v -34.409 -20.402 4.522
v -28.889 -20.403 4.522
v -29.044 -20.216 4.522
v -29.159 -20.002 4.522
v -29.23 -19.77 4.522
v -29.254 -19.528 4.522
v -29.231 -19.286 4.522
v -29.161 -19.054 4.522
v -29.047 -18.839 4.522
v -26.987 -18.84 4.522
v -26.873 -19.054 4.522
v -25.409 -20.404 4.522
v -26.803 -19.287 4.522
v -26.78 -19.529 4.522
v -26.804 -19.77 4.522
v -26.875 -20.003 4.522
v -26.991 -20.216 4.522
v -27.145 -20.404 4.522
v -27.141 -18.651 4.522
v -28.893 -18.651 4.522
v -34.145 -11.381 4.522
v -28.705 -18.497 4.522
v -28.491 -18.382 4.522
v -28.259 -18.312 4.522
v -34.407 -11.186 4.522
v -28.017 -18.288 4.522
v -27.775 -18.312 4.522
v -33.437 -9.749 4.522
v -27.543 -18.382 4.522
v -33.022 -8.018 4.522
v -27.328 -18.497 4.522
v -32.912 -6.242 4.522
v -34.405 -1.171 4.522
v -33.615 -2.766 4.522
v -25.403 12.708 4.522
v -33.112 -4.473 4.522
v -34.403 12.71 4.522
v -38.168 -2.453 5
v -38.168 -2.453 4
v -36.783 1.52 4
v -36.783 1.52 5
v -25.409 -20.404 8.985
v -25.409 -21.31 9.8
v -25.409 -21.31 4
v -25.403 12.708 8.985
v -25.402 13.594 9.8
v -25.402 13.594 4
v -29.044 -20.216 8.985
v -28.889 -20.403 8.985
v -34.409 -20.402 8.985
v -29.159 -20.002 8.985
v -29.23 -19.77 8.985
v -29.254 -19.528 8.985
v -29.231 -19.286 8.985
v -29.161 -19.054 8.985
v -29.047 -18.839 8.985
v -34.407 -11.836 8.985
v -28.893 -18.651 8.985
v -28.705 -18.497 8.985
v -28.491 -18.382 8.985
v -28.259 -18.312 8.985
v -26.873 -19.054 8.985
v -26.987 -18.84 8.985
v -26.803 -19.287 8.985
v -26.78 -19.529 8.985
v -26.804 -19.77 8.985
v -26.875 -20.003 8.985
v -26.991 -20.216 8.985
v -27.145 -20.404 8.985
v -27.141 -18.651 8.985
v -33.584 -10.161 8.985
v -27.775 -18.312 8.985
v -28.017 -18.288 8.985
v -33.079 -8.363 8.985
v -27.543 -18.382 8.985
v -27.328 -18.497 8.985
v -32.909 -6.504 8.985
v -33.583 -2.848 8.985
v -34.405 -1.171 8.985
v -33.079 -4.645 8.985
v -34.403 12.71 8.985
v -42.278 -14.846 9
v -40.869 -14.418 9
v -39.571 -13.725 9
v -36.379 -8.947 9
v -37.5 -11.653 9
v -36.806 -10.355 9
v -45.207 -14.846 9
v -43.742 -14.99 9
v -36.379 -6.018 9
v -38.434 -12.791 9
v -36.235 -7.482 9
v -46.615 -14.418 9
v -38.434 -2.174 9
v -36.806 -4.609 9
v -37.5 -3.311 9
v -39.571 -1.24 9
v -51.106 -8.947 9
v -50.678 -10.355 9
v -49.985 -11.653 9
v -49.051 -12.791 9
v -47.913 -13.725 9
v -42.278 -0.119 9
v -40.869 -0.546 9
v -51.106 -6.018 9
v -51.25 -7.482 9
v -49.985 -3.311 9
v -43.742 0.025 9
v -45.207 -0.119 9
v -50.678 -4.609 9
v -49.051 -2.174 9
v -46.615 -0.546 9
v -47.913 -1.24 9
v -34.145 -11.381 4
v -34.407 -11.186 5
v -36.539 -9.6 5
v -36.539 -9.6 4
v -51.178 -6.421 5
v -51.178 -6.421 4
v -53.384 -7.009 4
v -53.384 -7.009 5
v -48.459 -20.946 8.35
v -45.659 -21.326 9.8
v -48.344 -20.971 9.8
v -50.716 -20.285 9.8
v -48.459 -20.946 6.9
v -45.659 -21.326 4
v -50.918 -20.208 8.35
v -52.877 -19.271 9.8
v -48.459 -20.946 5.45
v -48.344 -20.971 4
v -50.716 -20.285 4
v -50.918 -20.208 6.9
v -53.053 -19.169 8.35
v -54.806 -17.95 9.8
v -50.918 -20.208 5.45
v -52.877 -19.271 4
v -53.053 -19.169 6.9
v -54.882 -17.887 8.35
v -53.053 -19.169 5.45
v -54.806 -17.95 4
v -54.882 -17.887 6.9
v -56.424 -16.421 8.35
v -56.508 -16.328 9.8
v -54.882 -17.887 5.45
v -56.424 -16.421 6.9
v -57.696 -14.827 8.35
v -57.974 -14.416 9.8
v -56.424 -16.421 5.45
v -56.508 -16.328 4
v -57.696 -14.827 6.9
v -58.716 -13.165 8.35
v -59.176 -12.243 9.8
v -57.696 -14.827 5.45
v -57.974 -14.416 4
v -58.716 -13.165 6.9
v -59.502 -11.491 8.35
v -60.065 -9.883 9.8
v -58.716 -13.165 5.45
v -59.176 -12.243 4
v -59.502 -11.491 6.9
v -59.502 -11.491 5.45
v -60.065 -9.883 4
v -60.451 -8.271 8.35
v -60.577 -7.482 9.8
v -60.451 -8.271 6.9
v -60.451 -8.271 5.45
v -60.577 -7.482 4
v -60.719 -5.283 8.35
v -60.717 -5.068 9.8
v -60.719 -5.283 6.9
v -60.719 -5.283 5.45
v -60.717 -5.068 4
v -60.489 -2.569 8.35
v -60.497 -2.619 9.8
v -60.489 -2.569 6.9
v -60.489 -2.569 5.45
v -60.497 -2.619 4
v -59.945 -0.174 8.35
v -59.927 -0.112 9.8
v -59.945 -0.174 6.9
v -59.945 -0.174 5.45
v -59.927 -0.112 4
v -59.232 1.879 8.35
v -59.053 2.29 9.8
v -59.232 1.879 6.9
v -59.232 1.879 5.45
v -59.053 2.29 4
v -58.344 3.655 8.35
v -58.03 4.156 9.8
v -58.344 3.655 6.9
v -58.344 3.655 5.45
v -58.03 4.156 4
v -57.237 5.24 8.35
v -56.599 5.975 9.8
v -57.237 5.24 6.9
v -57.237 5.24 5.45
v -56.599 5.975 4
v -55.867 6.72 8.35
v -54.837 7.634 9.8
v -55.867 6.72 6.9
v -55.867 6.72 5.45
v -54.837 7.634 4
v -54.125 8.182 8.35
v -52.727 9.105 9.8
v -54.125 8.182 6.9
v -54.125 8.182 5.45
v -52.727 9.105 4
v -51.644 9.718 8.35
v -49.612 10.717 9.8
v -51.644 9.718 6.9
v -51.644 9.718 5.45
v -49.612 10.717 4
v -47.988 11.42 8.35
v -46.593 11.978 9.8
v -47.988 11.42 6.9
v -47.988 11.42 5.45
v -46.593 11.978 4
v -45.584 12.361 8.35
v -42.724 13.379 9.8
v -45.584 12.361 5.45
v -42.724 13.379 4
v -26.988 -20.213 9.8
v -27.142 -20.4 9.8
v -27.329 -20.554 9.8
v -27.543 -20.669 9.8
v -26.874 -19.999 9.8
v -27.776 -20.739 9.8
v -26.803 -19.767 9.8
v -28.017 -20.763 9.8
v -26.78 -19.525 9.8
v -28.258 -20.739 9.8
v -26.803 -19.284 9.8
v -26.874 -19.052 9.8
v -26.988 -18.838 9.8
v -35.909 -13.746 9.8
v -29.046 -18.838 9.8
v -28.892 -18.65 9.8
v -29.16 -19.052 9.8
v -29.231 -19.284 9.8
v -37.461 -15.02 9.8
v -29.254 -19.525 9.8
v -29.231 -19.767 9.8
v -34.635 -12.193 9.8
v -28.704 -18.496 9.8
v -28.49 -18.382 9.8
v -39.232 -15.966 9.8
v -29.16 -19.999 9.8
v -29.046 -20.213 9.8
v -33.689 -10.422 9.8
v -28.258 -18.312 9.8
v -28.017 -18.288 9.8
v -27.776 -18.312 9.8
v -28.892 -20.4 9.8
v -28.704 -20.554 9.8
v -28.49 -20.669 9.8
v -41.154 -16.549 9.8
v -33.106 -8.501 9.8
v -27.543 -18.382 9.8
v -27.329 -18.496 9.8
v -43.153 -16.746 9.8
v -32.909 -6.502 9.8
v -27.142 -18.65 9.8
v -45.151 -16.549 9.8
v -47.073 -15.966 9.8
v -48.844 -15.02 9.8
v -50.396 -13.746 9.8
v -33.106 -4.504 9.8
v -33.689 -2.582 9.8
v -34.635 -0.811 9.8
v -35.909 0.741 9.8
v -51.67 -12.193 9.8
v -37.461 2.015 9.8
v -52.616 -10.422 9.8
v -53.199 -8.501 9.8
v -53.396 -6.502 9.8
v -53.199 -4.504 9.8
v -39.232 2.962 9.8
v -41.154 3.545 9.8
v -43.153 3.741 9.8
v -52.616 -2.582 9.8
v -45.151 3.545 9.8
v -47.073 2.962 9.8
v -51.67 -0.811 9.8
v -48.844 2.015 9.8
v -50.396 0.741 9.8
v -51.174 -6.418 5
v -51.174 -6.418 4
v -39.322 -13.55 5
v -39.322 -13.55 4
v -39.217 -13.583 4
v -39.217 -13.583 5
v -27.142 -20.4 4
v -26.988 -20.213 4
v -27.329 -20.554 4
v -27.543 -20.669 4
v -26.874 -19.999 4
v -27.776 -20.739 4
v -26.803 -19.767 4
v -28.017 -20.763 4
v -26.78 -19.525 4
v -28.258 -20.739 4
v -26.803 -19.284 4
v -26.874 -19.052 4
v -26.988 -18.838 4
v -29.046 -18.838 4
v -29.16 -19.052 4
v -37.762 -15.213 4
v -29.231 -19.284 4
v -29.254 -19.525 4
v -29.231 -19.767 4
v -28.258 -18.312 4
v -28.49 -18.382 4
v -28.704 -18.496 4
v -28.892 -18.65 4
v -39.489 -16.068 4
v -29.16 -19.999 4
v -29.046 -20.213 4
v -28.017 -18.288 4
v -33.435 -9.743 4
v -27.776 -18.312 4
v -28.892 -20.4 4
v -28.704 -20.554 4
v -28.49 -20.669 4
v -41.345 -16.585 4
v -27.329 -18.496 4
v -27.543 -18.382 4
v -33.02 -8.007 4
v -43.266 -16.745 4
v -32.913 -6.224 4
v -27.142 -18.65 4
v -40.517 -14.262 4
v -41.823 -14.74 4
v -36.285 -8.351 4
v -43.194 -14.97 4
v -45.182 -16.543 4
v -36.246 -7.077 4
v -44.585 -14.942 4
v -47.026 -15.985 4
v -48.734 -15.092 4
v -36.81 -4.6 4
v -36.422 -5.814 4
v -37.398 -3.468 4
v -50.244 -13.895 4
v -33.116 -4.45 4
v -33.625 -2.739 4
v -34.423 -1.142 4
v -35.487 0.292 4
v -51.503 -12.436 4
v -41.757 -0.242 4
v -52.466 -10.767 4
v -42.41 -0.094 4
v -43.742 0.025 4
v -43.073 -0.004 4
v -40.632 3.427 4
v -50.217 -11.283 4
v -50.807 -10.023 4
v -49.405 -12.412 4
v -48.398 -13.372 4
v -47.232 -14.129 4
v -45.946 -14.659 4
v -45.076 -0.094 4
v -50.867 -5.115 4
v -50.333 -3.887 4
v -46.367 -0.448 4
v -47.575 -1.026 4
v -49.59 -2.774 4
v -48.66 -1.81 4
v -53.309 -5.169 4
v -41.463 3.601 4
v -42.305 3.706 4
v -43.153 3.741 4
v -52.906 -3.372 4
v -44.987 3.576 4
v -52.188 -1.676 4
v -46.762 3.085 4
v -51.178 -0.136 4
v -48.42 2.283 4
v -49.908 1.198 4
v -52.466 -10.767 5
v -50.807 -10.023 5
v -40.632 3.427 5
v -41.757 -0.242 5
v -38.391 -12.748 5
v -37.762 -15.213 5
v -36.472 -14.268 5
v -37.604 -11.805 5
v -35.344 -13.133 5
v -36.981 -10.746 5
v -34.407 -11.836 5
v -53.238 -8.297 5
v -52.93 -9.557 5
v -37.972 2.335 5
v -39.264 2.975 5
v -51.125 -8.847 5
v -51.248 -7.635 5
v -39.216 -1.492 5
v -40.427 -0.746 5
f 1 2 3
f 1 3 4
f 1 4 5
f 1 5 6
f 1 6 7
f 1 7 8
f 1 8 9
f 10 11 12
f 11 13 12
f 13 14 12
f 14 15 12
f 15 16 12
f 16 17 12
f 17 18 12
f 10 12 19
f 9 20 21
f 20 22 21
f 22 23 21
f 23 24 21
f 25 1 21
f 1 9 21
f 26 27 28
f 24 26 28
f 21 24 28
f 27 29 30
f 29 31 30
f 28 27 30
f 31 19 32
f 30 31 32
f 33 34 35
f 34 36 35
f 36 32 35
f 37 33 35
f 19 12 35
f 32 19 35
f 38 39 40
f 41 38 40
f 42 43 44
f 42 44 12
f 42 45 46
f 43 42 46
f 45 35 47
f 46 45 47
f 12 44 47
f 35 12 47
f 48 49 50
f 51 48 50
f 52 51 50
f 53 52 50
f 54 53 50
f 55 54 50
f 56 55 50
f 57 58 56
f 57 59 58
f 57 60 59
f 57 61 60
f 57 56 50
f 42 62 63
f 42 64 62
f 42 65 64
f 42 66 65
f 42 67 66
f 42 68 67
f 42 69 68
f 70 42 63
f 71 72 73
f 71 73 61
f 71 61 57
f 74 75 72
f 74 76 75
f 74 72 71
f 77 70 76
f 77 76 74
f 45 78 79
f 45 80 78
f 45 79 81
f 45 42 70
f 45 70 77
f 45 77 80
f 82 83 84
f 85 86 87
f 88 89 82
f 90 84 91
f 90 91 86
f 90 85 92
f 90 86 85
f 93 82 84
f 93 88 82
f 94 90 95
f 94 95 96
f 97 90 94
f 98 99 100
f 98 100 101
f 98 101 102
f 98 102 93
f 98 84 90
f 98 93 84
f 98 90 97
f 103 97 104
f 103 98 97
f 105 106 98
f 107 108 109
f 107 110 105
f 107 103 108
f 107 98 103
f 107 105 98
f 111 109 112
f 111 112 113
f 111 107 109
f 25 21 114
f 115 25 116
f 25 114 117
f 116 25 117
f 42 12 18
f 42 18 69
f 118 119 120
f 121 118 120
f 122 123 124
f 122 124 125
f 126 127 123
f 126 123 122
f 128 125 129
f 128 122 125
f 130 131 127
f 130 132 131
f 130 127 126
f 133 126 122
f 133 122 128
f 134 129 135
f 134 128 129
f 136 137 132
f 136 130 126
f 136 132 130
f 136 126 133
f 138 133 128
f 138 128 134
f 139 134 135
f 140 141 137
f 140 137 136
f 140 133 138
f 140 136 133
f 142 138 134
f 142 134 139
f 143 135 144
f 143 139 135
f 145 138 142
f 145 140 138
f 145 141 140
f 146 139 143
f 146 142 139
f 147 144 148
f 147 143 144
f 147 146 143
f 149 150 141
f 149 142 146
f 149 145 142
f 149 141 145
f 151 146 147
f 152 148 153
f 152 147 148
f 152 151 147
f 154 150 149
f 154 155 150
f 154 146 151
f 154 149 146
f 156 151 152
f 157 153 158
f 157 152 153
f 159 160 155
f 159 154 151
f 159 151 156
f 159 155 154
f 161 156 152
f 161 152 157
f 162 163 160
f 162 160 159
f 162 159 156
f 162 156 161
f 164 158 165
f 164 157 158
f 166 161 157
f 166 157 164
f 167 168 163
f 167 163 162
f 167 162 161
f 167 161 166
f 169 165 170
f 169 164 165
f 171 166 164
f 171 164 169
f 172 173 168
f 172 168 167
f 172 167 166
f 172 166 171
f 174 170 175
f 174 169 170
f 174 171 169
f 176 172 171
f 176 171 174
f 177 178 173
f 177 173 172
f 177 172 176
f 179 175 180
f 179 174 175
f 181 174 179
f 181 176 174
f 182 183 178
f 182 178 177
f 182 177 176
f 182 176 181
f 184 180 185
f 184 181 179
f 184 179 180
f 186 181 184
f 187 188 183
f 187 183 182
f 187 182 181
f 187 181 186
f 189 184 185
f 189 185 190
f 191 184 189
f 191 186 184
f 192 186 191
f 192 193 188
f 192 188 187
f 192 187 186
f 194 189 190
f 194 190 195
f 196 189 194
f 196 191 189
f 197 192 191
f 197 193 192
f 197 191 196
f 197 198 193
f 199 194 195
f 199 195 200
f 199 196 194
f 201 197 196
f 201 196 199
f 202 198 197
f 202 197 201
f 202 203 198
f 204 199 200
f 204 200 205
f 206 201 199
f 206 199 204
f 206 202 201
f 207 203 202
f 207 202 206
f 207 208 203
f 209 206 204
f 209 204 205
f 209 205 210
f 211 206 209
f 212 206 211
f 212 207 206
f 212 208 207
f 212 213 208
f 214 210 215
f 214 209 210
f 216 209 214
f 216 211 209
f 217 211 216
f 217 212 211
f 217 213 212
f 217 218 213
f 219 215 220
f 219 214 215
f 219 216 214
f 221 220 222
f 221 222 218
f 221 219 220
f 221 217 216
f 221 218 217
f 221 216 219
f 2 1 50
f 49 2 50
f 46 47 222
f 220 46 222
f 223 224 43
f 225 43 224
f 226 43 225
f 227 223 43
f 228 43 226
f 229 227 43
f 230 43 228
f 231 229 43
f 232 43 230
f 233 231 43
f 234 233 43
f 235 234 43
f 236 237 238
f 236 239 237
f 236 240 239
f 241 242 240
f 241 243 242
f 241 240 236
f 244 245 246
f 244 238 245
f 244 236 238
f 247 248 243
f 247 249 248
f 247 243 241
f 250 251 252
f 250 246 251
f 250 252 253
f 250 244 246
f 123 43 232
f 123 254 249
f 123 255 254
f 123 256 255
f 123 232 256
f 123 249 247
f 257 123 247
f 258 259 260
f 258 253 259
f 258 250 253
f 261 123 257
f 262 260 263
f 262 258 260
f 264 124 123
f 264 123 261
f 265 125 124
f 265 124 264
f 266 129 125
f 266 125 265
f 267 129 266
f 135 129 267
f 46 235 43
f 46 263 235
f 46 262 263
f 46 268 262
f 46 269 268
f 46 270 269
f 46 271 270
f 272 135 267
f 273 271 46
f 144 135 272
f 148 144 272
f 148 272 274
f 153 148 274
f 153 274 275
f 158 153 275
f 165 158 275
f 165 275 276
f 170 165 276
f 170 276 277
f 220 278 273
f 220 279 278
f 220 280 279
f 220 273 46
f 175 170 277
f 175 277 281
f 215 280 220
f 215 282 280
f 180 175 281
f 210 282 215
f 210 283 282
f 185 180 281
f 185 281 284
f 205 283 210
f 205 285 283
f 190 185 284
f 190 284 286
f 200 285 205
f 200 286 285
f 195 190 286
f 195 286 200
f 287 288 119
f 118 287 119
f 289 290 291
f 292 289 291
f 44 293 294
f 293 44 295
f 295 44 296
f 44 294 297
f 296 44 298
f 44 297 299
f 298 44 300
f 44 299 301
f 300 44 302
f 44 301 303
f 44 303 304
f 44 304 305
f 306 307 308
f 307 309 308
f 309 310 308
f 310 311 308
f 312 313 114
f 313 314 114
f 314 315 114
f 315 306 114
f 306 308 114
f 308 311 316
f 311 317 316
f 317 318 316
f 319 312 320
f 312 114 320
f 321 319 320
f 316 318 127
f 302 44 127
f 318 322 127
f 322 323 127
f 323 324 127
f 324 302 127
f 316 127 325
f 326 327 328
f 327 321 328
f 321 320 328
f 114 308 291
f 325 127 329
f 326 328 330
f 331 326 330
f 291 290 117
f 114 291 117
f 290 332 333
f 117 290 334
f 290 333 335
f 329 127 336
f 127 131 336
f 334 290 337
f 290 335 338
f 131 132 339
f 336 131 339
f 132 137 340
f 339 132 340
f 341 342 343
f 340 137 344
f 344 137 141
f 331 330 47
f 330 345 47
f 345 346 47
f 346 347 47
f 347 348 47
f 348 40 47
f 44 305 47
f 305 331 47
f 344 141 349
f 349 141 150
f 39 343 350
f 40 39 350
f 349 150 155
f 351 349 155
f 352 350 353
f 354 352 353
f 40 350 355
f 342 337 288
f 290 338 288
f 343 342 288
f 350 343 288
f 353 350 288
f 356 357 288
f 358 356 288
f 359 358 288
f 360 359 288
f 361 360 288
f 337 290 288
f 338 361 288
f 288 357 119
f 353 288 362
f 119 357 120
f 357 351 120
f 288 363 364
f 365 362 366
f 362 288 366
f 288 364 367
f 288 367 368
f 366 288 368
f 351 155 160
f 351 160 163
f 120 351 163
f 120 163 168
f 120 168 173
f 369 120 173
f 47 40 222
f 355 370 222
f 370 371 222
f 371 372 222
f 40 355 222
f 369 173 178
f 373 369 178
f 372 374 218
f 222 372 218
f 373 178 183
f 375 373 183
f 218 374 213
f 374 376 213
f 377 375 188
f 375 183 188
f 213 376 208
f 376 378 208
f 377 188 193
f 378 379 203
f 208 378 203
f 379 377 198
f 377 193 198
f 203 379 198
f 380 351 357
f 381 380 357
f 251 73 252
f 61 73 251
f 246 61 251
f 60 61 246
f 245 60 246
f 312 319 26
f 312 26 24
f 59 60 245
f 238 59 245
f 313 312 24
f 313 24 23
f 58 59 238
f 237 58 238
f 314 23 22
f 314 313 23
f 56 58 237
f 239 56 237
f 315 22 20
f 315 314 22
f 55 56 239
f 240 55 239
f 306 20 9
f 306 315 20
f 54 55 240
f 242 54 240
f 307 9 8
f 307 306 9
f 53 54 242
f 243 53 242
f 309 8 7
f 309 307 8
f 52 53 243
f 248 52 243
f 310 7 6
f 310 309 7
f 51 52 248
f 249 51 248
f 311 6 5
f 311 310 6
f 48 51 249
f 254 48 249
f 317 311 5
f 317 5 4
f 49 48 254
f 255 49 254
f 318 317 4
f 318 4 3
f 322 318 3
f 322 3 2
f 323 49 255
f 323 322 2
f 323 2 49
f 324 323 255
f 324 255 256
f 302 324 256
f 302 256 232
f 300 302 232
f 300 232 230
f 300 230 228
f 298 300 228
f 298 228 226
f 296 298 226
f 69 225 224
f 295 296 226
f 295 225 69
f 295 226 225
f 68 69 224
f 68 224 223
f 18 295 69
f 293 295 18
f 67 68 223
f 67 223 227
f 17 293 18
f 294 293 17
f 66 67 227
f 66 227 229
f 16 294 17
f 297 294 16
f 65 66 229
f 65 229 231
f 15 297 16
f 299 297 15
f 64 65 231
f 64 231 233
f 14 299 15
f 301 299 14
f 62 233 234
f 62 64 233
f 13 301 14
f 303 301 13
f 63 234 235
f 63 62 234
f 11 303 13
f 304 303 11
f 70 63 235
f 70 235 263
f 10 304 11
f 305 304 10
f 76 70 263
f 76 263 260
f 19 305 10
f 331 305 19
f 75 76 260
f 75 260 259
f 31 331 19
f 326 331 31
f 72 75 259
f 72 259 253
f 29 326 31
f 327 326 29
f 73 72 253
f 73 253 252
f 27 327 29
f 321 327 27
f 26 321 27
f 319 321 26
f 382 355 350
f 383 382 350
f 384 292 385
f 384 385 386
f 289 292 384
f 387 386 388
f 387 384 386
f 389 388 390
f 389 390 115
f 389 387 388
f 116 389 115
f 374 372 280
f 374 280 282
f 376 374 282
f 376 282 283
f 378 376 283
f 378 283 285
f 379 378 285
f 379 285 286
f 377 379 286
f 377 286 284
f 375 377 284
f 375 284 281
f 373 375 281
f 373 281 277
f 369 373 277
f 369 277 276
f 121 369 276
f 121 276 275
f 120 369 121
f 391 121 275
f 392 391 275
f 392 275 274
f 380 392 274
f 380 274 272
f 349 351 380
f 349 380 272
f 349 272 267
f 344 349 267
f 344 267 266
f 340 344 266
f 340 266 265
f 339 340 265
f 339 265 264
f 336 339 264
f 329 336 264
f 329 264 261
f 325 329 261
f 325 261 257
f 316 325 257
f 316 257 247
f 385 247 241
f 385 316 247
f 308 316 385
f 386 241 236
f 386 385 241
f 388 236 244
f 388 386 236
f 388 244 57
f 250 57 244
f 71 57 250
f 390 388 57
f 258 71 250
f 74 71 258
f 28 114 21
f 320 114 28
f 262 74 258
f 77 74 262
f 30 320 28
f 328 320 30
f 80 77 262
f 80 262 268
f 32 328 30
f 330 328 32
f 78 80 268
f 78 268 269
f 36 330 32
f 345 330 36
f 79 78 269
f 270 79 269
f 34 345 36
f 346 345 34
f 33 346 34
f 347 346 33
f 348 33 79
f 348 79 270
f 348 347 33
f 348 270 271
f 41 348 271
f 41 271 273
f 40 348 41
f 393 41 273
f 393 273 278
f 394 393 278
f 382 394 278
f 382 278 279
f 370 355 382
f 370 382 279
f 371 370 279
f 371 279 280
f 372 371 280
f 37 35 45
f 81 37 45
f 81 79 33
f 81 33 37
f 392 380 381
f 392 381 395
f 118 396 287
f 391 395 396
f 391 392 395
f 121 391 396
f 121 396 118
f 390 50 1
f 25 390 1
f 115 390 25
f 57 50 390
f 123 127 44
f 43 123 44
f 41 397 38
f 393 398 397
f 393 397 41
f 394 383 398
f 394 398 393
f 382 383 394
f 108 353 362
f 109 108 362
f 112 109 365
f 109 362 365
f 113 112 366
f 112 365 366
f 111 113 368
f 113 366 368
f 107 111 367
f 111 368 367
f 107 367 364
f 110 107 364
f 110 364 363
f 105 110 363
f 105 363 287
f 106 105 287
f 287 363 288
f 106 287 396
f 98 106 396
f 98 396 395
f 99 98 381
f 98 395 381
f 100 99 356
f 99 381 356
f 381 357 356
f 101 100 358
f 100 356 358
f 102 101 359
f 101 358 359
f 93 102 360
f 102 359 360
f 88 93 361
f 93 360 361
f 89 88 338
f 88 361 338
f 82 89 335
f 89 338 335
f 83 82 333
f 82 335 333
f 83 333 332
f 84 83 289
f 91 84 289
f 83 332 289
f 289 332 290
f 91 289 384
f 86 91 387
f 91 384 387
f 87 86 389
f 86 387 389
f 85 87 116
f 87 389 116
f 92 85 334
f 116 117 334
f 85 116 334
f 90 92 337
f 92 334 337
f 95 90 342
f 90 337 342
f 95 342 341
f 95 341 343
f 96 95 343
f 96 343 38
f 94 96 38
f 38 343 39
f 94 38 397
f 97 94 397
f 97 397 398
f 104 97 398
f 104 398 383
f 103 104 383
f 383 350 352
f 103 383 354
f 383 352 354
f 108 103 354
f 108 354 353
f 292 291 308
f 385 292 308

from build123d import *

# Parameters (mm, degrees)
SKETCH006_R             = 10.24367
SKETCH006_R_2           = 1.237403
PAD005_DEPTH            = 5.8
PAD006_DEPTH            = 1
SKETCH008_R             = 7.5076691177
PAD007_DEPTH            = 5
SKETCH009_W             = 33.111977
SKETCH009_H             = 4.462531
POCKET001_DEPTH         = 9
BODY001_PLACEMENT_ANGLE = 90


with BuildPart() as part:
    # Sketch006 → Pad005 (new body)
    with BuildSketch(Plane.XY):
        with BuildLine():
            Line((-18.4256, -1.34093), (-18.409945, -21.590897))
            Line((-18.409945, -21.590897), (16.494272, -21.597601))
            Line((16.494272, -21.597601), (16.2785, -4.27596))
            add(Edge.make_bspline(
                [(-18.4256, -1.34093), (-17.942909, 6.597493), (-8.092874, 14.805856), (3.694337, 13.295516), (9.670027, 9.683837), (13.4539, 4.00771), (16.2785, -4.27596)],
                knots=[0, 0, 0, 0, 0.25, 0.5, 0.75, 1, 1, 1, 1], degree=3))
        make_face()
        with Locations((-3.602271, -3.847481)):
            Circle(SKETCH006_R, mode=Mode.SUBTRACT)
        with Locations((-16.625307, -18.983036)):
            Circle(SKETCH006_R_2, mode=Mode.SUBTRACT)
    extrude(amount=PAD005_DEPTH)

    # Sketch007 → Pad006 (join)
    with BuildSketch(Plane.XY):
        Polygon((-8.077186, 5.935153), (-7.114697, 3.787175), (-10.68287, -7.783438), (-12.927779, -9.78625), (-8.900146, -13.417724), (-6.14903, -9.720223), (0.343604, -8.795849), (5.141551, -10.468527), (6.924273, -6.550939), (2.544497, -5.208394), (-3.520839, 4.178236), (-4.27353, 7.000822), align=None)
    extrude(amount=PAD006_DEPTH)

    # Sketch008 → Pad007 (join)
    with BuildSketch(Plane.XY):
        with Locations((-4.582225, -3.257763)):
            Circle(SKETCH008_R)
    extrude(amount=PAD007_DEPTH)

    # Sketch009 (on Face3 of Pad007) → Pocket001 (cut)
    with BuildSketch(Plane(origin=(-0.0041476098, -21.5944321736, 0), x_dir=(0.9999999816, -0.0001920685, 0), z_dir=(-0.0001920685, -0.9999999816, 0))):
        with Locations((-0.9438935, 2.7535015)):
            Rectangle(SKETCH009_W, SKETCH009_H)
    extrude(amount=-POCKET001_DEPTH, mode=Mode.SUBTRACT)


with BuildPart() as part_1:
    # Body001 placement: moved
    add(part.part.moved(Location((-47, -2.9, 4))).rotate(Axis((-47, -2.9, 4), (0, 0, 1)), BODY001_PLACEMENT_ANGLE))


solid = part_1.part
